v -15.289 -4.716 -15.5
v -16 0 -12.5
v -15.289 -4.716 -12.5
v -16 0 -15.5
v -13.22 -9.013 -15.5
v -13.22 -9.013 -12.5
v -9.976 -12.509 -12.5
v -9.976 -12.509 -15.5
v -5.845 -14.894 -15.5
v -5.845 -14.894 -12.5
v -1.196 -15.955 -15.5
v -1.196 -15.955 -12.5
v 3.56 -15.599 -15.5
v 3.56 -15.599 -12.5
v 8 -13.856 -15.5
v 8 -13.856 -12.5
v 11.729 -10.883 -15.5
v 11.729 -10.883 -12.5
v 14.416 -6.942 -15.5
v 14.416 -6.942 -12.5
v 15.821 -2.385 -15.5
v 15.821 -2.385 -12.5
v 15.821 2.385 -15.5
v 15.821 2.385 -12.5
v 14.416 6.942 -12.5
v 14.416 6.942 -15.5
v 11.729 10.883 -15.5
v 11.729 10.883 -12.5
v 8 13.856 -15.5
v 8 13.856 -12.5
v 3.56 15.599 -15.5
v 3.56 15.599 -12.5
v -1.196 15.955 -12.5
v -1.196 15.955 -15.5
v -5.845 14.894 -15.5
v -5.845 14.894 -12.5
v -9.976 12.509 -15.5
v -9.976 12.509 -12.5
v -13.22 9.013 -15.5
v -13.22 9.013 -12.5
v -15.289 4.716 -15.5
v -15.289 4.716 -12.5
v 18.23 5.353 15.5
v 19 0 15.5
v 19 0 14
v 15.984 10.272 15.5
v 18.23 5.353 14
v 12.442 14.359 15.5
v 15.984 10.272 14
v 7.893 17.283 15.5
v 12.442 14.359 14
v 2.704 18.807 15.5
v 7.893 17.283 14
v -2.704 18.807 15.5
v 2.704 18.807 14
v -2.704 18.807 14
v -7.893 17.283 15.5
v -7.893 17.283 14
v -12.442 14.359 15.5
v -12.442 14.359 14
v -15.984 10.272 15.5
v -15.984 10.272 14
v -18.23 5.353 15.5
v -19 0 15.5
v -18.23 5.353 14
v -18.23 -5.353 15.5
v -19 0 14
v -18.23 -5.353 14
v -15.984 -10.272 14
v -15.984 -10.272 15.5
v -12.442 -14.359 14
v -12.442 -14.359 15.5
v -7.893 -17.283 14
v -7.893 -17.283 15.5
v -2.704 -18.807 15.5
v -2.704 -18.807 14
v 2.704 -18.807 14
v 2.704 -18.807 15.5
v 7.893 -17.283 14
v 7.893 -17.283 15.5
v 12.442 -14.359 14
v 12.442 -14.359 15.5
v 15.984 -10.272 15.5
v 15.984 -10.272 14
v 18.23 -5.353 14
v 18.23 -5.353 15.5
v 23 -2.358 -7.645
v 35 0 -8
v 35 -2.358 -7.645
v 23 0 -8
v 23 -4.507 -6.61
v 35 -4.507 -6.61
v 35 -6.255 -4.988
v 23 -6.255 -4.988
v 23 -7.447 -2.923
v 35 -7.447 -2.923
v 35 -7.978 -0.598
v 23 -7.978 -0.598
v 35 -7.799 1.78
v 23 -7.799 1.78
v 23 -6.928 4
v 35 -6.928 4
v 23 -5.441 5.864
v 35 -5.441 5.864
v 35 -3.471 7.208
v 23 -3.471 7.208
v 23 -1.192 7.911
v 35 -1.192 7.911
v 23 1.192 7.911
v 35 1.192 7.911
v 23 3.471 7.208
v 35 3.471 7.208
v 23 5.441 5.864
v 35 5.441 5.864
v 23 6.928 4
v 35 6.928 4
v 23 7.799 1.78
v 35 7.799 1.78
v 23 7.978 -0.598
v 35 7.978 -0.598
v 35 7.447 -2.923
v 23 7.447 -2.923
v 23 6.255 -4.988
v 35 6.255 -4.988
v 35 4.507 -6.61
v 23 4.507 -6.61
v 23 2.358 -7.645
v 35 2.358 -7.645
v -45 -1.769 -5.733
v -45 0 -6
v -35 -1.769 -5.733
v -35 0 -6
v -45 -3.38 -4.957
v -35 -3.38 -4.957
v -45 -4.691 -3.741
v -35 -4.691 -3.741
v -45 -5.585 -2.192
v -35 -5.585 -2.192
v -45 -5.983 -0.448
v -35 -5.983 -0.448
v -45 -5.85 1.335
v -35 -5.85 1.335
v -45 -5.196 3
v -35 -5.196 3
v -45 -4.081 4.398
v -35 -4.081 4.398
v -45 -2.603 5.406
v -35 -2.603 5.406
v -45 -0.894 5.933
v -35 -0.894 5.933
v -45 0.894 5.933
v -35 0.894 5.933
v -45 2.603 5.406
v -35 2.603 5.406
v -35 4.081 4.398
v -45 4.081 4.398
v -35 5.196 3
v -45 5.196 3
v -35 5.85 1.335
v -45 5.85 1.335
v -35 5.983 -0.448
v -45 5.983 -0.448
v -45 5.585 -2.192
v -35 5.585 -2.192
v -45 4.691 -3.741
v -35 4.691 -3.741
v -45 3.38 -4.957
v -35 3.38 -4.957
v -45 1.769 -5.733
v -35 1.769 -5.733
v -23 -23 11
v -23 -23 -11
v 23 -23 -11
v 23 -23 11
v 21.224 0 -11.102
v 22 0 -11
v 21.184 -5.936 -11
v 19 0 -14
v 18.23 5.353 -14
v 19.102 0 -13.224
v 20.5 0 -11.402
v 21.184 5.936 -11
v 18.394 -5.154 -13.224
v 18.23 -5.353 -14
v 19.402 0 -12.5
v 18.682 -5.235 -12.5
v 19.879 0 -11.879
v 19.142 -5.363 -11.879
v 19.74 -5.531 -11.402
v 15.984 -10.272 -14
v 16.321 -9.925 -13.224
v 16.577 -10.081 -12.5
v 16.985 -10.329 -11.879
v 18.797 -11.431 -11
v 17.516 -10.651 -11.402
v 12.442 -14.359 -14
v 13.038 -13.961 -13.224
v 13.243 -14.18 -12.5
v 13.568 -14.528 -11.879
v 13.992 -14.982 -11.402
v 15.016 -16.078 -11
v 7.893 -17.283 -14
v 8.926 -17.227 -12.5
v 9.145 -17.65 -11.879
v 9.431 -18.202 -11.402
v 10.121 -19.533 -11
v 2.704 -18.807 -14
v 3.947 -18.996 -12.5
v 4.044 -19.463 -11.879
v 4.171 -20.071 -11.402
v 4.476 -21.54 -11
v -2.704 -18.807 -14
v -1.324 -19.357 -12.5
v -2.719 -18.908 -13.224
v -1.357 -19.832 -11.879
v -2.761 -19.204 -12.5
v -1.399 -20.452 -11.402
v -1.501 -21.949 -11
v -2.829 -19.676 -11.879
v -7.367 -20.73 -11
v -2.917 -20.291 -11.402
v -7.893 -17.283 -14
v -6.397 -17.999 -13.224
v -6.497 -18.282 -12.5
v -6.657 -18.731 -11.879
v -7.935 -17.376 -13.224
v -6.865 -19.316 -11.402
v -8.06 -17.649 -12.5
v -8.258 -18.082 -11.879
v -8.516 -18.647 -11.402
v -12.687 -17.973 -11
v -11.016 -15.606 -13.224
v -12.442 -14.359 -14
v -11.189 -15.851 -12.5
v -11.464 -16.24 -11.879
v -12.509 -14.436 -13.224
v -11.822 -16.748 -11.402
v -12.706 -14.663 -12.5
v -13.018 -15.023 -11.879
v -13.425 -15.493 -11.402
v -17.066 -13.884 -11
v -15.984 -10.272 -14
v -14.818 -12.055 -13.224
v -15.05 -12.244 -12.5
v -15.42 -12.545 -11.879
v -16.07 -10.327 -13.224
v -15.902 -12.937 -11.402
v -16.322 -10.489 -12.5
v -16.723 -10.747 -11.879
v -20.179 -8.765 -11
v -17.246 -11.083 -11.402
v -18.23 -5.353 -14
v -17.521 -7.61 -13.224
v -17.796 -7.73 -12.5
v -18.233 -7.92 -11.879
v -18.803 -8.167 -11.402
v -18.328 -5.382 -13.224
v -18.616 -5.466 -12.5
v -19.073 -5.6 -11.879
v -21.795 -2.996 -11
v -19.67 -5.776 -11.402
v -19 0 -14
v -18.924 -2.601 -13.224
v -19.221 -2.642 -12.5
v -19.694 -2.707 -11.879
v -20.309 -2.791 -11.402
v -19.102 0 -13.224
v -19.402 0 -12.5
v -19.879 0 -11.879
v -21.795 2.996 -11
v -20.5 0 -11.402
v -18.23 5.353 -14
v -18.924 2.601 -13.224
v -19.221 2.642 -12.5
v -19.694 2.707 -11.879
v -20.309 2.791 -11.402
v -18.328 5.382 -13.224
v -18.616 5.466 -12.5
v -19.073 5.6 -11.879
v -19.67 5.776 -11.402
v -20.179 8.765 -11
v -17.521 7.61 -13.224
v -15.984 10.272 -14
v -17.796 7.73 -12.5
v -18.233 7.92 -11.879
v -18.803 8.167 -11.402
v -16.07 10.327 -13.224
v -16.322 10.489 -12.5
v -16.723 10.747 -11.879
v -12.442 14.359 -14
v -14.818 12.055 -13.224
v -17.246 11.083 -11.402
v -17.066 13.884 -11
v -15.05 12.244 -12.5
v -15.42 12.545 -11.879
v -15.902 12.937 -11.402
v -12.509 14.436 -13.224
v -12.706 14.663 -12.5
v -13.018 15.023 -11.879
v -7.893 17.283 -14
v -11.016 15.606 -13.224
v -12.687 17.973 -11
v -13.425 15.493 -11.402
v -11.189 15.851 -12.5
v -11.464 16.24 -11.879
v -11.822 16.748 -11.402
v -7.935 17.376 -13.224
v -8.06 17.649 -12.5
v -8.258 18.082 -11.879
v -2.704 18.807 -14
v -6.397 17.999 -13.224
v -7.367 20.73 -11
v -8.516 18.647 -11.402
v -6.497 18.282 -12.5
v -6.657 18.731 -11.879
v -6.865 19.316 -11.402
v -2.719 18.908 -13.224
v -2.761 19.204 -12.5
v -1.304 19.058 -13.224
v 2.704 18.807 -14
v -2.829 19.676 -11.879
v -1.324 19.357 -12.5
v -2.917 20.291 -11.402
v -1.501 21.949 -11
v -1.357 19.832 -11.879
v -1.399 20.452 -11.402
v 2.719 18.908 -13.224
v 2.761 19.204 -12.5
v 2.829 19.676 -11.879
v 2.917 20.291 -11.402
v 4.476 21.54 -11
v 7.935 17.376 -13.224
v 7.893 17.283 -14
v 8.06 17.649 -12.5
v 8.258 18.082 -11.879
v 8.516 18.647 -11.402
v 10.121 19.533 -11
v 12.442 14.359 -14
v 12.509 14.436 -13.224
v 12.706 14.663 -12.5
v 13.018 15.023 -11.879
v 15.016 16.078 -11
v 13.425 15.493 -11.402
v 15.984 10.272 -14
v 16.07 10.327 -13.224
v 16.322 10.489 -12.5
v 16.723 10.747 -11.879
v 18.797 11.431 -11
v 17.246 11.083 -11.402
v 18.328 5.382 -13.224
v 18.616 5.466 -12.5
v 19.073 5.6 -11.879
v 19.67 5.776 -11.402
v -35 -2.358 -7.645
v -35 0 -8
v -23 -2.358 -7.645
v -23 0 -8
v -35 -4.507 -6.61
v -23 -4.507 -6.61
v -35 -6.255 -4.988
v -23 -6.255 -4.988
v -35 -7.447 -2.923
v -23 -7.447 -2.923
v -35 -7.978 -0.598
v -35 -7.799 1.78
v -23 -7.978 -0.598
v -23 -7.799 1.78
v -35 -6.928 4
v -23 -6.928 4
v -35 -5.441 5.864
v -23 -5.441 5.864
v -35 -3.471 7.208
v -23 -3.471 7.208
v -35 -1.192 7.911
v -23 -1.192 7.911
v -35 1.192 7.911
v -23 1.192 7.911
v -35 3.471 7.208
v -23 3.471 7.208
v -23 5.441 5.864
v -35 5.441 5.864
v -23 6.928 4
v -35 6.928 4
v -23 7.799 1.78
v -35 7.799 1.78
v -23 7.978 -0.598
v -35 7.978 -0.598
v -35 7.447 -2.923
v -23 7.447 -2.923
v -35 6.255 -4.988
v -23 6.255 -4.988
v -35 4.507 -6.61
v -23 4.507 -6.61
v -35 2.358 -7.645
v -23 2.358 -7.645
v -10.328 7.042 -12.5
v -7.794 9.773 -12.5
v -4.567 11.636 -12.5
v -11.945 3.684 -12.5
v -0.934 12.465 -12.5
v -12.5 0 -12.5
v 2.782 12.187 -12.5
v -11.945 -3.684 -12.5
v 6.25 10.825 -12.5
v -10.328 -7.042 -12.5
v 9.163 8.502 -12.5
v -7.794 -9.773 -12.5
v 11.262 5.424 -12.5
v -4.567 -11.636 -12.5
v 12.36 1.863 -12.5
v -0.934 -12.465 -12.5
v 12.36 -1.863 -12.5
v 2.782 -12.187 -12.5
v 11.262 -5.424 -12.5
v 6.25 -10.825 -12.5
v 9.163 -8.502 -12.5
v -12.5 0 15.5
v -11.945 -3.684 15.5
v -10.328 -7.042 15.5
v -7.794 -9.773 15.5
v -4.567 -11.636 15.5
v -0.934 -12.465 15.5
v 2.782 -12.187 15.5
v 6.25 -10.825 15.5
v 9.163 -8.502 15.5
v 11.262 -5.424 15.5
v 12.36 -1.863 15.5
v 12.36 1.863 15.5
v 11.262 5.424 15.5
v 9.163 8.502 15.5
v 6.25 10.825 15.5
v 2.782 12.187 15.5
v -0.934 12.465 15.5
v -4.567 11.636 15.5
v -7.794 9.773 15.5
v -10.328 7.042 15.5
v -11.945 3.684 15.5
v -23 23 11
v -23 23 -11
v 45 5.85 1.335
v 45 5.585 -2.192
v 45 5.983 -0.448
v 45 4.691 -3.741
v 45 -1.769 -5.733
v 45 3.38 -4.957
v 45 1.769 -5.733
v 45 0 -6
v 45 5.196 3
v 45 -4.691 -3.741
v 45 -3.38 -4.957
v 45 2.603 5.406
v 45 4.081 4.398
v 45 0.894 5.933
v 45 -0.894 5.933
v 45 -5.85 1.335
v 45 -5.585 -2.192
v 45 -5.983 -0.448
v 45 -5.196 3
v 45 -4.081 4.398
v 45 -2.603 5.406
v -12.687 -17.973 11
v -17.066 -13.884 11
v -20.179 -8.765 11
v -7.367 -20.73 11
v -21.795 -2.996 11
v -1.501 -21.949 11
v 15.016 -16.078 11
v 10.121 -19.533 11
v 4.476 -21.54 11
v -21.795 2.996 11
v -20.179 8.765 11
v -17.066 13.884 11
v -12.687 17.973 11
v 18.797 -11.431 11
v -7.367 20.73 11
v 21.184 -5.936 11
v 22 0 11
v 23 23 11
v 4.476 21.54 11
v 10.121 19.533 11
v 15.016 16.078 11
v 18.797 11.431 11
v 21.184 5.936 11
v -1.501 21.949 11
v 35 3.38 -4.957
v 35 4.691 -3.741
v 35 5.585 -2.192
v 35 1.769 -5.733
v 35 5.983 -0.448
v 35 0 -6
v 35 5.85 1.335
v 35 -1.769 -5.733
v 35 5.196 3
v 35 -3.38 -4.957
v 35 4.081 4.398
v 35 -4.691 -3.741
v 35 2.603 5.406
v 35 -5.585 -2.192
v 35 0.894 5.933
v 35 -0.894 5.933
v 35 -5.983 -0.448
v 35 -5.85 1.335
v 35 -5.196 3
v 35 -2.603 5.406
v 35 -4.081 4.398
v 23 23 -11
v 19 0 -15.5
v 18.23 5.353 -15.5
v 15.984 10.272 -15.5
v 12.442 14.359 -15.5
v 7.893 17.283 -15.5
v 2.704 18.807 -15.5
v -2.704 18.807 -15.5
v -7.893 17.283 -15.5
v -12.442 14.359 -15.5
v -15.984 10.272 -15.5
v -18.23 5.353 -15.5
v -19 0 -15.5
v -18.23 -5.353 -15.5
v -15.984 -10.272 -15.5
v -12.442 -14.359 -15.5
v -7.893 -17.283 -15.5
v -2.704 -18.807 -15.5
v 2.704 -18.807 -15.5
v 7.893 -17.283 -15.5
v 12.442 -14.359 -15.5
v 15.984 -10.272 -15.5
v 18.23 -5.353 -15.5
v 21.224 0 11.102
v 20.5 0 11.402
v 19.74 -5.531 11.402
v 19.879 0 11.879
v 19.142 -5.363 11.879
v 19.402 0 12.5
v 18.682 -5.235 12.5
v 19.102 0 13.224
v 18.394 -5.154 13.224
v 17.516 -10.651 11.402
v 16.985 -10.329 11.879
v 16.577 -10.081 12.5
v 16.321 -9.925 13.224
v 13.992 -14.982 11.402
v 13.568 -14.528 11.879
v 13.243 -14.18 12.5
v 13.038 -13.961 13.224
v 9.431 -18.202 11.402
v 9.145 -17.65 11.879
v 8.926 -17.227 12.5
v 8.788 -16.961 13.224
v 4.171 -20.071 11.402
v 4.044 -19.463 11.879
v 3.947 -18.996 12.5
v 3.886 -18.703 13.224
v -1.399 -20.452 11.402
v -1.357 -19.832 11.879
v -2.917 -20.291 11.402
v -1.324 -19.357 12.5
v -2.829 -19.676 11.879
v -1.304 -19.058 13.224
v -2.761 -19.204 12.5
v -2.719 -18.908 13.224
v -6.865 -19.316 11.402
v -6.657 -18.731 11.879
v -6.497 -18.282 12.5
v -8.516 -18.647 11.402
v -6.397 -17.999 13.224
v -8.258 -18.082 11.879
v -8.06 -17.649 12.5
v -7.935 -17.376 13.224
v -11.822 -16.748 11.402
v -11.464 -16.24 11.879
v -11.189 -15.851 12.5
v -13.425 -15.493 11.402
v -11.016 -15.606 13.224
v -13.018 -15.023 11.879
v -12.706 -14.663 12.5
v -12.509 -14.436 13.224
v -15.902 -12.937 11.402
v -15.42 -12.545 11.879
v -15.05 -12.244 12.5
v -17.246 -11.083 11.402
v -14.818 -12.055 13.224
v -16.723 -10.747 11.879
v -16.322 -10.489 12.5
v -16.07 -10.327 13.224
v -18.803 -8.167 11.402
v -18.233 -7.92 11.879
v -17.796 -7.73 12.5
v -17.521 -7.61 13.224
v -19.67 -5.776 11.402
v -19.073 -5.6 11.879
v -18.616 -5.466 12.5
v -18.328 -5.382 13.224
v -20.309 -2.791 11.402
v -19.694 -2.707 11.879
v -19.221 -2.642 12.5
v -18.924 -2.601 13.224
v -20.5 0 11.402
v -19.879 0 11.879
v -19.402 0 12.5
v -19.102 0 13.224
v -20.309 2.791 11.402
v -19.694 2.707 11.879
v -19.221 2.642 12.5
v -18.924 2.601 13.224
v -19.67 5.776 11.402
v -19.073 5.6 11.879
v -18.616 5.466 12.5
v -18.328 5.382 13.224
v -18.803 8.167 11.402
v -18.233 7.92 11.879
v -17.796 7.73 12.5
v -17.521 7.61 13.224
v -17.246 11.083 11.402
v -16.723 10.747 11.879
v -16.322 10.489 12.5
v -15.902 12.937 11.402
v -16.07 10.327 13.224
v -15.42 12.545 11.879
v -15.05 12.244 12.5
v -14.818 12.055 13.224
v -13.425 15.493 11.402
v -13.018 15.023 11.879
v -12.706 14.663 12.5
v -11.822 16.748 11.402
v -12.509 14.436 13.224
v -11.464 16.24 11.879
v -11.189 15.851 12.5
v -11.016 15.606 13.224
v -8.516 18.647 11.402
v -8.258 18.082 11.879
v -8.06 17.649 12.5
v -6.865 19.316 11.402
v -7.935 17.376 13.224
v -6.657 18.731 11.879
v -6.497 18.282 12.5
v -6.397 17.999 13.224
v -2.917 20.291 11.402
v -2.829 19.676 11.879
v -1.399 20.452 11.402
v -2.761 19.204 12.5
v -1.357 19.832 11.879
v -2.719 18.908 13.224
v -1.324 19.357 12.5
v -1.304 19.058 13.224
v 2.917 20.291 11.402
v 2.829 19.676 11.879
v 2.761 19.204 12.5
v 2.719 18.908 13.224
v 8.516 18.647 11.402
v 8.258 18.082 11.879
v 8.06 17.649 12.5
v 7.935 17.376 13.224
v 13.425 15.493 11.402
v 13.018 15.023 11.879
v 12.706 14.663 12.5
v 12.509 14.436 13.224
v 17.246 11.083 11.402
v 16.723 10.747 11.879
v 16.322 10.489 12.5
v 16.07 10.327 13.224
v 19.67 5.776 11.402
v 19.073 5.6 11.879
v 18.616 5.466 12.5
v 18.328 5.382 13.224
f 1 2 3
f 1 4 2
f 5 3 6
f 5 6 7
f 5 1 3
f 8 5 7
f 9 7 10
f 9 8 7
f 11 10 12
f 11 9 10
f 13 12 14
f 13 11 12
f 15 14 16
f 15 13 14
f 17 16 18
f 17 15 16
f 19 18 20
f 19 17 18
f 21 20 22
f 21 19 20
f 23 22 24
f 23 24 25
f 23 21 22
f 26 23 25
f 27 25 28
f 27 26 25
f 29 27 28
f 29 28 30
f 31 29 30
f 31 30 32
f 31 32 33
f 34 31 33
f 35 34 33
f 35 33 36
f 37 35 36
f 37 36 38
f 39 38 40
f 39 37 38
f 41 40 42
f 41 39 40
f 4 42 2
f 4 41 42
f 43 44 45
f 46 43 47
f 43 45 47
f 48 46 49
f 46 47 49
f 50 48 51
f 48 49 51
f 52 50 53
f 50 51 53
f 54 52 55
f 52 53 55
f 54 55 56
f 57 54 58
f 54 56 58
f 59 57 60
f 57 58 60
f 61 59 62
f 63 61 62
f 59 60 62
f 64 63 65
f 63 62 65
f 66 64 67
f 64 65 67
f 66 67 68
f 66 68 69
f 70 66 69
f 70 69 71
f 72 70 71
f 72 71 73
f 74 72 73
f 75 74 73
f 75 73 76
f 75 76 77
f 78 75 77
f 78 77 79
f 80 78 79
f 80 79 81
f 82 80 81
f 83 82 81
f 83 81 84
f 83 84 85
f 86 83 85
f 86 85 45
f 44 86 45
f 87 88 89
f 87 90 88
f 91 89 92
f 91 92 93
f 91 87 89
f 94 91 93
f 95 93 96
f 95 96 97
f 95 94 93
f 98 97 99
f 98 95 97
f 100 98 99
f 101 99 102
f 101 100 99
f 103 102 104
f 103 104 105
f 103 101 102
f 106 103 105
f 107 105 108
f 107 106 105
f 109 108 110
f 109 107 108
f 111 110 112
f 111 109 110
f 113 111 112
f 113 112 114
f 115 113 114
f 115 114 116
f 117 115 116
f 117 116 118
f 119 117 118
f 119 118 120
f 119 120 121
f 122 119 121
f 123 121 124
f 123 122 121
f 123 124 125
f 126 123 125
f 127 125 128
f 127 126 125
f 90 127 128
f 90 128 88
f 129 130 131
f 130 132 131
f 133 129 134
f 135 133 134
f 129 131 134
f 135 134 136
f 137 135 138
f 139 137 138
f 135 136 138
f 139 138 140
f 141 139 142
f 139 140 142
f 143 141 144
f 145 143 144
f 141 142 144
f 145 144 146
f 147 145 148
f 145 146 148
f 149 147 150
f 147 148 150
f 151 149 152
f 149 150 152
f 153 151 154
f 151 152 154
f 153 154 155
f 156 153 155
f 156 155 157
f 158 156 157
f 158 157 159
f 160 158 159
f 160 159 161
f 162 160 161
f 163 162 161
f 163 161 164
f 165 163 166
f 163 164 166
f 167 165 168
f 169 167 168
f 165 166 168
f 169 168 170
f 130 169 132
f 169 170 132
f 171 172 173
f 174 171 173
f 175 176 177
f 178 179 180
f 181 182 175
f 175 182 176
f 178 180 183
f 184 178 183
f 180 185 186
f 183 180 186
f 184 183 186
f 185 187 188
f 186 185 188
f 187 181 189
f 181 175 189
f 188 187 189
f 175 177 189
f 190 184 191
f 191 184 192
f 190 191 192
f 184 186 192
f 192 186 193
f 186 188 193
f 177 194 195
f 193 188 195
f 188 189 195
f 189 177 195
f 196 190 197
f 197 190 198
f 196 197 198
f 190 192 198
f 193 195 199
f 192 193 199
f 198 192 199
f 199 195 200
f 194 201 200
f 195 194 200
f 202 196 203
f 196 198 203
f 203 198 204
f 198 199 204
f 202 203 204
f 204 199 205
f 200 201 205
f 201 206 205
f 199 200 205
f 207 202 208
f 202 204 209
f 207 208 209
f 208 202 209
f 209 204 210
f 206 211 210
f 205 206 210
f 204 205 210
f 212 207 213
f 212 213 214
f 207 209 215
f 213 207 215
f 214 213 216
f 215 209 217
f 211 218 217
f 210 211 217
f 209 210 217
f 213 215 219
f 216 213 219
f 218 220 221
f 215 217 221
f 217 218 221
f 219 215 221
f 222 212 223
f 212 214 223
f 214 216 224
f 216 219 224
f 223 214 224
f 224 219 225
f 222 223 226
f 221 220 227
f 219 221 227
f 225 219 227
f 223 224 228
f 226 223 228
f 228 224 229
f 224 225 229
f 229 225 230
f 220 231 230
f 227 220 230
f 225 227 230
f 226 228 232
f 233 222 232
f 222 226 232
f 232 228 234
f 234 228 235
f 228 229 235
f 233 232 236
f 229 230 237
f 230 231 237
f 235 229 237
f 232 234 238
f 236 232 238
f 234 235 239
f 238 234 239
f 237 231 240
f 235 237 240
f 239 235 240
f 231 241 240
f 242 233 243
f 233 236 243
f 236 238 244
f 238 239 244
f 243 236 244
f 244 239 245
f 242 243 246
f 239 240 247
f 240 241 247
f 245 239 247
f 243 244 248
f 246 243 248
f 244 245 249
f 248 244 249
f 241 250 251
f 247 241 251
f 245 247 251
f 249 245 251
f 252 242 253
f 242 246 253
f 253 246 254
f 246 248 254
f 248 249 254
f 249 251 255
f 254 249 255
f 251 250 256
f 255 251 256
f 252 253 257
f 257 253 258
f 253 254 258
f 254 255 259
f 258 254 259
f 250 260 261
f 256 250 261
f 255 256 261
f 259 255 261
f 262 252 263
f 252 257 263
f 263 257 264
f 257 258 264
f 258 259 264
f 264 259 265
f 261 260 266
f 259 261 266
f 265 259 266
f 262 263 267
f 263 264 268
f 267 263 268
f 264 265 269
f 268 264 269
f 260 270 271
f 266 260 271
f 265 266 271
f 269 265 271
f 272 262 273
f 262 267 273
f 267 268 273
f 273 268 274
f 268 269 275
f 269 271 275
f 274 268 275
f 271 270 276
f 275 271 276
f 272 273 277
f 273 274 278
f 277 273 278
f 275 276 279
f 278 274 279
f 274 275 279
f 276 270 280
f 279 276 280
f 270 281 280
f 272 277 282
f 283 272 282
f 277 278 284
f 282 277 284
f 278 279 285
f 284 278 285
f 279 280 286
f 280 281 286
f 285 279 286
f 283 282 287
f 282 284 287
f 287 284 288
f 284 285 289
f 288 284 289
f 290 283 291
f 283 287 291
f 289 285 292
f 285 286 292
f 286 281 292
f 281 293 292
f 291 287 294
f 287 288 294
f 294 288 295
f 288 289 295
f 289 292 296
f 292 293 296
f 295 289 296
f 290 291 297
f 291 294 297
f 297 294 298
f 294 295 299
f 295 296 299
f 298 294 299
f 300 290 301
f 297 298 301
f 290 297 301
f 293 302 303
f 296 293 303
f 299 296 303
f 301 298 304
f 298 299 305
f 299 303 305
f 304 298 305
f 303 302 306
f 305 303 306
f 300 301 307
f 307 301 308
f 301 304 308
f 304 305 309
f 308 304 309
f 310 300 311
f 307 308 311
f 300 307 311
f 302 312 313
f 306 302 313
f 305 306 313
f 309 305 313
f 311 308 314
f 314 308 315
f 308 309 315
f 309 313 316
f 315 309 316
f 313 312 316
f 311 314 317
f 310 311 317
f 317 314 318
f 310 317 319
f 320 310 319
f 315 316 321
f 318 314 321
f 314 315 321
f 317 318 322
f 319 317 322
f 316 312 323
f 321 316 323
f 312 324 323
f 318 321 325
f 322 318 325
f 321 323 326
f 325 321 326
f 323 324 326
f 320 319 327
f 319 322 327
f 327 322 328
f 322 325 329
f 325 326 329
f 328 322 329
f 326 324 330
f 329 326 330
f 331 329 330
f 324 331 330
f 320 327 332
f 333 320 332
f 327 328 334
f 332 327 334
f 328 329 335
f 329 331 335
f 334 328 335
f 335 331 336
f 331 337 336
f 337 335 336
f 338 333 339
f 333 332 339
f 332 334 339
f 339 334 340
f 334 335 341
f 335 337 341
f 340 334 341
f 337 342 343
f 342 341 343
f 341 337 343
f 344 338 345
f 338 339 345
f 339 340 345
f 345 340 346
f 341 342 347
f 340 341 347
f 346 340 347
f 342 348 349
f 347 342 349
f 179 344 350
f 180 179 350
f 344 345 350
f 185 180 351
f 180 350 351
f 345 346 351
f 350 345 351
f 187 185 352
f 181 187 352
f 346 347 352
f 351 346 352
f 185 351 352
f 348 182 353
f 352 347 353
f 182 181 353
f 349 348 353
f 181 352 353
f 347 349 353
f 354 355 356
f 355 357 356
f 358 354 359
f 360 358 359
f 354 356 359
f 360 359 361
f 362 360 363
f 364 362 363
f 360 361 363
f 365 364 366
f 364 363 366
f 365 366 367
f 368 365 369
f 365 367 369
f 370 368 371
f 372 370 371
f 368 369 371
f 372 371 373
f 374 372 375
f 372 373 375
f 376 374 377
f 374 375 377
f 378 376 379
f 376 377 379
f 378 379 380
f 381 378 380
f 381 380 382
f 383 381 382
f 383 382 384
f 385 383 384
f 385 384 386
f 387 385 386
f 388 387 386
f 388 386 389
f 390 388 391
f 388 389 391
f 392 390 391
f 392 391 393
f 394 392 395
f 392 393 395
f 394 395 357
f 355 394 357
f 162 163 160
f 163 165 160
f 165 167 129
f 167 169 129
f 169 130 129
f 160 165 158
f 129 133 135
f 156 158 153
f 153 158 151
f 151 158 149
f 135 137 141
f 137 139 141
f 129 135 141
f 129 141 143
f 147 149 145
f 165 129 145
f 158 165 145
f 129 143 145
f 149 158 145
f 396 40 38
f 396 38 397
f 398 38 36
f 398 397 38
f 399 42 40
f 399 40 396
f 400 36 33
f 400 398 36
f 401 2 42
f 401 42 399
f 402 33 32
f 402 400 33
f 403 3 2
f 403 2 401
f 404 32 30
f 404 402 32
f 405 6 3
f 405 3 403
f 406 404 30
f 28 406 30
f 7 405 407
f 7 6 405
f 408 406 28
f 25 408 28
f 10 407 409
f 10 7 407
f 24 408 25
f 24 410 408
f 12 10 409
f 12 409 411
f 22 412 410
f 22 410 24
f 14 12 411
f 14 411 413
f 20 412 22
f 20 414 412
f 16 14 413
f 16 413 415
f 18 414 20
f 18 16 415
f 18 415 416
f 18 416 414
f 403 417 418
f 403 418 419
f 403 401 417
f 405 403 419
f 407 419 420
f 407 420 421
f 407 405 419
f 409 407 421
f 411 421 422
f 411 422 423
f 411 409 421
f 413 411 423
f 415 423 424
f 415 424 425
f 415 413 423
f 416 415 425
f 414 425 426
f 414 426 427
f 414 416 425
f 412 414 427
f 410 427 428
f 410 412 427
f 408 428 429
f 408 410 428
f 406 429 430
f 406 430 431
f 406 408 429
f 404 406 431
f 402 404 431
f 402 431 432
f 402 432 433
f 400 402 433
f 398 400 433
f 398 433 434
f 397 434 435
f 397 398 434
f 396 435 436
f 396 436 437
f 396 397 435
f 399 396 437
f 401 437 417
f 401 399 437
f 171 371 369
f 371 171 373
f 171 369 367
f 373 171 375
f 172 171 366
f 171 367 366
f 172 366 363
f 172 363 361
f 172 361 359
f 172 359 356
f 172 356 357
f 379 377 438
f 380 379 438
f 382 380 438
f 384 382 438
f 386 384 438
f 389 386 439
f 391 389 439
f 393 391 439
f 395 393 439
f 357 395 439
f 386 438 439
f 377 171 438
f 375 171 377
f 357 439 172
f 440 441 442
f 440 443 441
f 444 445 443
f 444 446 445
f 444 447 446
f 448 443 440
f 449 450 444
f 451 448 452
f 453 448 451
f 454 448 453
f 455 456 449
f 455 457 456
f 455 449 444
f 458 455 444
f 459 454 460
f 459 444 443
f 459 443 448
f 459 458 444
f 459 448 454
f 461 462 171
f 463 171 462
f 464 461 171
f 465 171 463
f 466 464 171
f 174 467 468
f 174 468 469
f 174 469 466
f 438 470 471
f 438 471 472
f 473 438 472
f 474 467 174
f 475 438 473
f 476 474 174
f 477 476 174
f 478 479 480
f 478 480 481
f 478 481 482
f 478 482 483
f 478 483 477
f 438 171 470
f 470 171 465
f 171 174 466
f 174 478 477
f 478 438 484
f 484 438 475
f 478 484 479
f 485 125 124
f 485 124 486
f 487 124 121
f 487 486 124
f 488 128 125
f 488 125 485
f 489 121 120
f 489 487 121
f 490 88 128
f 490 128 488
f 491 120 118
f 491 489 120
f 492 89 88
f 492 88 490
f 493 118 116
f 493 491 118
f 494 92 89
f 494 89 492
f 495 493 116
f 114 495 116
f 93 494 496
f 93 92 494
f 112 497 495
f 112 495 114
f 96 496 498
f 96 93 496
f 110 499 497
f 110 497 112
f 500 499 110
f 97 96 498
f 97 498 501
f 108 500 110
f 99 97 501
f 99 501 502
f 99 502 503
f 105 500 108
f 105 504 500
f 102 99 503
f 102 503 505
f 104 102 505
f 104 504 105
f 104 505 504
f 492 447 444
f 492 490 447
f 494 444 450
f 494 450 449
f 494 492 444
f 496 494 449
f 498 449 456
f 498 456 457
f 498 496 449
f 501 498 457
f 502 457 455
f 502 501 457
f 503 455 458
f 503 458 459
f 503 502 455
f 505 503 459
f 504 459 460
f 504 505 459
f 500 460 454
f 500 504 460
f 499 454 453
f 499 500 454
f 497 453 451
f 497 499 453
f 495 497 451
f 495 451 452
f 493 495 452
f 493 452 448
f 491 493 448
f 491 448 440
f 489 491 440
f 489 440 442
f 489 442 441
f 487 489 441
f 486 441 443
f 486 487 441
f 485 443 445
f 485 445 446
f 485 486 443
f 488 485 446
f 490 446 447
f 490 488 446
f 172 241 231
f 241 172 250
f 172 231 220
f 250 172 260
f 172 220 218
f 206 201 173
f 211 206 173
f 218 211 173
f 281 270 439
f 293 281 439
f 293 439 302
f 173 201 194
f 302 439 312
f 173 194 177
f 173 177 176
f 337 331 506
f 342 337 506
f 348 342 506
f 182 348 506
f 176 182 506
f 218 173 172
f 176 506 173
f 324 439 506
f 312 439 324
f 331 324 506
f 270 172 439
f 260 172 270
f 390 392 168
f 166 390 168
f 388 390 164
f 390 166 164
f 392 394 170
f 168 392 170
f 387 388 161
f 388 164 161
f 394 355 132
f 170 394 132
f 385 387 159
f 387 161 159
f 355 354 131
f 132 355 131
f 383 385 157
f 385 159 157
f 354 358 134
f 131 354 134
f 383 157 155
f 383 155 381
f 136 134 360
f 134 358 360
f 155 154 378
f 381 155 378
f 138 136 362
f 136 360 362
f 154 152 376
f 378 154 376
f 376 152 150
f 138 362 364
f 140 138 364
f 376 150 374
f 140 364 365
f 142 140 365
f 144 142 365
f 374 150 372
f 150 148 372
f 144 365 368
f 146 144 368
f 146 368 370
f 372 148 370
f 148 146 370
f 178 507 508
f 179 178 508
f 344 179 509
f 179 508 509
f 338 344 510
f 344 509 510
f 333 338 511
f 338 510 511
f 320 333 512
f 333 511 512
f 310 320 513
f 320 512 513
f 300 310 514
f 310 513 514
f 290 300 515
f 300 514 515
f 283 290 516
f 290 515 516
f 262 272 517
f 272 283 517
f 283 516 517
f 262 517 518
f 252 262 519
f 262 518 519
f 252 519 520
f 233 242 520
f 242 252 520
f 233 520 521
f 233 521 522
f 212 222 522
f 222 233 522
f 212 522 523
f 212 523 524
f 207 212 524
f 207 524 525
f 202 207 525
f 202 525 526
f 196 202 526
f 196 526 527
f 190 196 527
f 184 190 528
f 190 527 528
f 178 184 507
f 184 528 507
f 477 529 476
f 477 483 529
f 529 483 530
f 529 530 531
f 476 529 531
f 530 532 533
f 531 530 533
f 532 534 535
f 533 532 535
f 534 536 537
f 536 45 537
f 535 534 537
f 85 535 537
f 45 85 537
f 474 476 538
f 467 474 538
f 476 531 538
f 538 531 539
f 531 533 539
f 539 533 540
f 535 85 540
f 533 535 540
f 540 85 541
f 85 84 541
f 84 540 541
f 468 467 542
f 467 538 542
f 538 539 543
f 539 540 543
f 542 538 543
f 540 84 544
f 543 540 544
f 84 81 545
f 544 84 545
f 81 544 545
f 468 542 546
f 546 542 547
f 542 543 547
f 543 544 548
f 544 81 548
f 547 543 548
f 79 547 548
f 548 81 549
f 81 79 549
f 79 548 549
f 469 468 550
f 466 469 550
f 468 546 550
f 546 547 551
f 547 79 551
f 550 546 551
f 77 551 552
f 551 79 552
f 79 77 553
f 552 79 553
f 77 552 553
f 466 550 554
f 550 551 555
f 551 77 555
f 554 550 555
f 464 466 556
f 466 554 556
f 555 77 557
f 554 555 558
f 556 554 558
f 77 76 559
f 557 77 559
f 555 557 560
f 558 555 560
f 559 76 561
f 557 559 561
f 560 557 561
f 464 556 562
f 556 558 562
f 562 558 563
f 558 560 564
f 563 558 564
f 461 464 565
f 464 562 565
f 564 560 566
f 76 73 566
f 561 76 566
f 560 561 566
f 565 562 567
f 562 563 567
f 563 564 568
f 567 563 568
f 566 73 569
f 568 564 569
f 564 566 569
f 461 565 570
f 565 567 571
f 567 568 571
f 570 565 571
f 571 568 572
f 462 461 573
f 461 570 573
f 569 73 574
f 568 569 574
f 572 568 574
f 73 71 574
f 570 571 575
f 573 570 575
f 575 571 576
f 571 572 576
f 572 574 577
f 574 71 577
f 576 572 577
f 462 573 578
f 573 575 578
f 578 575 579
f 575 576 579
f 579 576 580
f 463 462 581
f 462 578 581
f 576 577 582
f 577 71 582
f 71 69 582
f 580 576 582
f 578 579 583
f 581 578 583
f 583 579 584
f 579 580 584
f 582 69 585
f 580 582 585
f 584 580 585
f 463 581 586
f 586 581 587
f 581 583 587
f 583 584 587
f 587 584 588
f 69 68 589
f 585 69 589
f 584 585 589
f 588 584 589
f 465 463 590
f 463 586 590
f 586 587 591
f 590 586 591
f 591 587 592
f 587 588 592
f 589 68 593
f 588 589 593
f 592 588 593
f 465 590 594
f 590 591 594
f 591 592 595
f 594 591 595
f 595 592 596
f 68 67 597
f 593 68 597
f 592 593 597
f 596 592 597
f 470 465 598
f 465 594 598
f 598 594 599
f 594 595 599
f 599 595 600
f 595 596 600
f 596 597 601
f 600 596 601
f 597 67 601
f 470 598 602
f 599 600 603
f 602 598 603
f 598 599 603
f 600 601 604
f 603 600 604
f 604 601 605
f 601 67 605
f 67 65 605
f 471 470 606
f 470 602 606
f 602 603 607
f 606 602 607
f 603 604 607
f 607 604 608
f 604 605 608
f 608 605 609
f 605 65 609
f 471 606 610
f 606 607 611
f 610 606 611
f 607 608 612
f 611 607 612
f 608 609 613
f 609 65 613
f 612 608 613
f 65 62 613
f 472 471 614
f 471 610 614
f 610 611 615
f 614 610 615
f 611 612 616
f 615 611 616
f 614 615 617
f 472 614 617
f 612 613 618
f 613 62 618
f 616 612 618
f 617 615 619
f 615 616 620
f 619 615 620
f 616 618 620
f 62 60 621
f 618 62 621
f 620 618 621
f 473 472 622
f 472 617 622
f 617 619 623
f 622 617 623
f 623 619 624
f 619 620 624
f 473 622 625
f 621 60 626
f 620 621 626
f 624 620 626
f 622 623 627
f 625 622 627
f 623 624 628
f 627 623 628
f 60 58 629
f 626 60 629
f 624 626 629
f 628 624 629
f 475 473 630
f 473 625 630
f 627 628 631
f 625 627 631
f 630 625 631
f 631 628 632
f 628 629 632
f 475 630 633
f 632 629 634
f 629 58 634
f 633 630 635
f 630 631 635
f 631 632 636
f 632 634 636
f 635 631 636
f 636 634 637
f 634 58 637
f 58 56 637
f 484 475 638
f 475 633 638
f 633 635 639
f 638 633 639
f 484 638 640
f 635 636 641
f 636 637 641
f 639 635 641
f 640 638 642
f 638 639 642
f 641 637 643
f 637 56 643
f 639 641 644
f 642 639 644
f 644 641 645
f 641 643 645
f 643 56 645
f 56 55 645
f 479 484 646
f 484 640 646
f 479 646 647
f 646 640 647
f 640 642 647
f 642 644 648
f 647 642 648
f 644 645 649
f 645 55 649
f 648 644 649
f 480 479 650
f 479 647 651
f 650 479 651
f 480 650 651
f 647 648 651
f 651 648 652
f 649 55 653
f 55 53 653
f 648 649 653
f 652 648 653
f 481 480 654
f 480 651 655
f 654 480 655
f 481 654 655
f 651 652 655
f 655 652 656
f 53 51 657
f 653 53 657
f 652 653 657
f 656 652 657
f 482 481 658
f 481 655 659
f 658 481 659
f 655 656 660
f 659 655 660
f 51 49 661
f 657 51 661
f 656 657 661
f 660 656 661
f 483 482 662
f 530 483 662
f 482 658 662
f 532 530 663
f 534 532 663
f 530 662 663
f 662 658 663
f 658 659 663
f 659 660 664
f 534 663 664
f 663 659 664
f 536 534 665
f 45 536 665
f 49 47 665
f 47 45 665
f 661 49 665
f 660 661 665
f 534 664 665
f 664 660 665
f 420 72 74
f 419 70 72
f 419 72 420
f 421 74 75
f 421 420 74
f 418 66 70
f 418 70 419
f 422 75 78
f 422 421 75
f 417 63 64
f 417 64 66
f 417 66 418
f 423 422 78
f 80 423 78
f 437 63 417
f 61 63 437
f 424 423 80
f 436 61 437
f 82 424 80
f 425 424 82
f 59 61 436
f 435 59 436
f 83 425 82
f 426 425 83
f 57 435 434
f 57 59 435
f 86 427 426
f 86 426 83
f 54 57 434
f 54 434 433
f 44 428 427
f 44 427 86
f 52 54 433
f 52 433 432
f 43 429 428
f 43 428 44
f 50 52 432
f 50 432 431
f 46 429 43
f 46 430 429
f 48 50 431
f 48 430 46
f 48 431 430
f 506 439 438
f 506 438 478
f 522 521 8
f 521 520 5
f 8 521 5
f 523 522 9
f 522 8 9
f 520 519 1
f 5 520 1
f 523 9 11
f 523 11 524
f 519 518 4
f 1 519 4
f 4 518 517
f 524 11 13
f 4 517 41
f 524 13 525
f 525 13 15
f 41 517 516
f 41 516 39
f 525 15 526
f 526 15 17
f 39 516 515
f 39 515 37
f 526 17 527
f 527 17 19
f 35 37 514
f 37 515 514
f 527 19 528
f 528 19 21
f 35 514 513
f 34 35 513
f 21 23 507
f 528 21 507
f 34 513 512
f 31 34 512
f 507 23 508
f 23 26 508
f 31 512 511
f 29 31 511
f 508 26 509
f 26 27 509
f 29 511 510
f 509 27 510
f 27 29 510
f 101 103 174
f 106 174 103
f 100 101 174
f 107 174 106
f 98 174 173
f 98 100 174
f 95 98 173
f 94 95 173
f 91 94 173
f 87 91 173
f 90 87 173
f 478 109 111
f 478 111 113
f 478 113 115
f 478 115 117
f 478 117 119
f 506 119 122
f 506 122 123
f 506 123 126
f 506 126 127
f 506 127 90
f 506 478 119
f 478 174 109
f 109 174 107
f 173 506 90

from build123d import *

# Parameters (mm, degrees)
SKETCH1_W                = 46
SKETCH1_H                = 22
BOSS_EXTRUDE1_DEPTH      = 23
BOSS_EXTRUDE2_DEPTH      = 4.5
BOSS_EXTRUDE2_DEPTH_BACK = 26.5
SKETCH2_R                = 19
FILLET1_R                = 3


with BuildPart() as part:
    # Sketch1 → Boss-Extrude1 (new, symmetric)
    with BuildSketch(Plane(origin=(0, 0, 0), x_dir=(1, 0, 0), z_dir=(0, 1, 0))):
        Rectangle(SKETCH1_W, SKETCH1_H)
    extrude(amount=BOSS_EXTRUDE1_DEPTH, both=True)

    # Sketch2 → Boss-Extrude2 (add, two sides: drawn at the far end of the back side and taken through both)
    with BuildSketch(Plane.XY.offset(11).offset(-BOSS_EXTRUDE2_DEPTH_BACK)):
        Circle(SKETCH2_R)
    extrude(amount=BOSS_EXTRUDE2_DEPTH + BOSS_EXTRUDE2_DEPTH_BACK)

    # Sketch3 → Cut-Revolve1 (revolve, cut)
    with BuildSketch(Plane(origin=(0, 0, 0), x_dir=(1, 0, 0), z_dir=(0, 1, 0)), mode=Mode.PRIVATE) as cut_revolve1_sk:
        Polygon((0, 15.5), (0, -15.5), (12.5, -15.5), (12.5, 12.5), (16, 12.5), (16, 15.5), align=None)
    revolve(cut_revolve1_sk.sketch.rotate(Axis((0, 0, -15.5), (0, 0, 1)), 180), axis=Axis((0, 0, -15.5), (0, 0, 1)), mode=Mode.SUBTRACT)

    # Sketch4 → Revolve1 (revolve)
    with BuildSketch(Plane(origin=(0, 0, 0), x_dir=(1, 0, 0), z_dir=(0, 1, 0))):
        Polygon((-45, 0), (-45, 6), (-35, 6), (-35, 8), (-23, 8), (-23, 0), align=None)
    revolve1 = revolve(axis=Axis((-23, 0, 0), (-1, 0, 0)))

    # Mirror1: Revolve1 across plane
    add(revolve1.mirror(Plane(origin=(0, 0, 0), x_dir=(0, 0, 1), z_dir=(1, 0, 0))))

    # Fillet1
    fillet1_edges = [part.edges().sort_by_distance(p)[0] for p in [
        (-19, 0, -11),
        (-19, 0, 11),
    ]]
    fillet(fillet1_edges, radius=FILLET1_R)


solid = part.part
